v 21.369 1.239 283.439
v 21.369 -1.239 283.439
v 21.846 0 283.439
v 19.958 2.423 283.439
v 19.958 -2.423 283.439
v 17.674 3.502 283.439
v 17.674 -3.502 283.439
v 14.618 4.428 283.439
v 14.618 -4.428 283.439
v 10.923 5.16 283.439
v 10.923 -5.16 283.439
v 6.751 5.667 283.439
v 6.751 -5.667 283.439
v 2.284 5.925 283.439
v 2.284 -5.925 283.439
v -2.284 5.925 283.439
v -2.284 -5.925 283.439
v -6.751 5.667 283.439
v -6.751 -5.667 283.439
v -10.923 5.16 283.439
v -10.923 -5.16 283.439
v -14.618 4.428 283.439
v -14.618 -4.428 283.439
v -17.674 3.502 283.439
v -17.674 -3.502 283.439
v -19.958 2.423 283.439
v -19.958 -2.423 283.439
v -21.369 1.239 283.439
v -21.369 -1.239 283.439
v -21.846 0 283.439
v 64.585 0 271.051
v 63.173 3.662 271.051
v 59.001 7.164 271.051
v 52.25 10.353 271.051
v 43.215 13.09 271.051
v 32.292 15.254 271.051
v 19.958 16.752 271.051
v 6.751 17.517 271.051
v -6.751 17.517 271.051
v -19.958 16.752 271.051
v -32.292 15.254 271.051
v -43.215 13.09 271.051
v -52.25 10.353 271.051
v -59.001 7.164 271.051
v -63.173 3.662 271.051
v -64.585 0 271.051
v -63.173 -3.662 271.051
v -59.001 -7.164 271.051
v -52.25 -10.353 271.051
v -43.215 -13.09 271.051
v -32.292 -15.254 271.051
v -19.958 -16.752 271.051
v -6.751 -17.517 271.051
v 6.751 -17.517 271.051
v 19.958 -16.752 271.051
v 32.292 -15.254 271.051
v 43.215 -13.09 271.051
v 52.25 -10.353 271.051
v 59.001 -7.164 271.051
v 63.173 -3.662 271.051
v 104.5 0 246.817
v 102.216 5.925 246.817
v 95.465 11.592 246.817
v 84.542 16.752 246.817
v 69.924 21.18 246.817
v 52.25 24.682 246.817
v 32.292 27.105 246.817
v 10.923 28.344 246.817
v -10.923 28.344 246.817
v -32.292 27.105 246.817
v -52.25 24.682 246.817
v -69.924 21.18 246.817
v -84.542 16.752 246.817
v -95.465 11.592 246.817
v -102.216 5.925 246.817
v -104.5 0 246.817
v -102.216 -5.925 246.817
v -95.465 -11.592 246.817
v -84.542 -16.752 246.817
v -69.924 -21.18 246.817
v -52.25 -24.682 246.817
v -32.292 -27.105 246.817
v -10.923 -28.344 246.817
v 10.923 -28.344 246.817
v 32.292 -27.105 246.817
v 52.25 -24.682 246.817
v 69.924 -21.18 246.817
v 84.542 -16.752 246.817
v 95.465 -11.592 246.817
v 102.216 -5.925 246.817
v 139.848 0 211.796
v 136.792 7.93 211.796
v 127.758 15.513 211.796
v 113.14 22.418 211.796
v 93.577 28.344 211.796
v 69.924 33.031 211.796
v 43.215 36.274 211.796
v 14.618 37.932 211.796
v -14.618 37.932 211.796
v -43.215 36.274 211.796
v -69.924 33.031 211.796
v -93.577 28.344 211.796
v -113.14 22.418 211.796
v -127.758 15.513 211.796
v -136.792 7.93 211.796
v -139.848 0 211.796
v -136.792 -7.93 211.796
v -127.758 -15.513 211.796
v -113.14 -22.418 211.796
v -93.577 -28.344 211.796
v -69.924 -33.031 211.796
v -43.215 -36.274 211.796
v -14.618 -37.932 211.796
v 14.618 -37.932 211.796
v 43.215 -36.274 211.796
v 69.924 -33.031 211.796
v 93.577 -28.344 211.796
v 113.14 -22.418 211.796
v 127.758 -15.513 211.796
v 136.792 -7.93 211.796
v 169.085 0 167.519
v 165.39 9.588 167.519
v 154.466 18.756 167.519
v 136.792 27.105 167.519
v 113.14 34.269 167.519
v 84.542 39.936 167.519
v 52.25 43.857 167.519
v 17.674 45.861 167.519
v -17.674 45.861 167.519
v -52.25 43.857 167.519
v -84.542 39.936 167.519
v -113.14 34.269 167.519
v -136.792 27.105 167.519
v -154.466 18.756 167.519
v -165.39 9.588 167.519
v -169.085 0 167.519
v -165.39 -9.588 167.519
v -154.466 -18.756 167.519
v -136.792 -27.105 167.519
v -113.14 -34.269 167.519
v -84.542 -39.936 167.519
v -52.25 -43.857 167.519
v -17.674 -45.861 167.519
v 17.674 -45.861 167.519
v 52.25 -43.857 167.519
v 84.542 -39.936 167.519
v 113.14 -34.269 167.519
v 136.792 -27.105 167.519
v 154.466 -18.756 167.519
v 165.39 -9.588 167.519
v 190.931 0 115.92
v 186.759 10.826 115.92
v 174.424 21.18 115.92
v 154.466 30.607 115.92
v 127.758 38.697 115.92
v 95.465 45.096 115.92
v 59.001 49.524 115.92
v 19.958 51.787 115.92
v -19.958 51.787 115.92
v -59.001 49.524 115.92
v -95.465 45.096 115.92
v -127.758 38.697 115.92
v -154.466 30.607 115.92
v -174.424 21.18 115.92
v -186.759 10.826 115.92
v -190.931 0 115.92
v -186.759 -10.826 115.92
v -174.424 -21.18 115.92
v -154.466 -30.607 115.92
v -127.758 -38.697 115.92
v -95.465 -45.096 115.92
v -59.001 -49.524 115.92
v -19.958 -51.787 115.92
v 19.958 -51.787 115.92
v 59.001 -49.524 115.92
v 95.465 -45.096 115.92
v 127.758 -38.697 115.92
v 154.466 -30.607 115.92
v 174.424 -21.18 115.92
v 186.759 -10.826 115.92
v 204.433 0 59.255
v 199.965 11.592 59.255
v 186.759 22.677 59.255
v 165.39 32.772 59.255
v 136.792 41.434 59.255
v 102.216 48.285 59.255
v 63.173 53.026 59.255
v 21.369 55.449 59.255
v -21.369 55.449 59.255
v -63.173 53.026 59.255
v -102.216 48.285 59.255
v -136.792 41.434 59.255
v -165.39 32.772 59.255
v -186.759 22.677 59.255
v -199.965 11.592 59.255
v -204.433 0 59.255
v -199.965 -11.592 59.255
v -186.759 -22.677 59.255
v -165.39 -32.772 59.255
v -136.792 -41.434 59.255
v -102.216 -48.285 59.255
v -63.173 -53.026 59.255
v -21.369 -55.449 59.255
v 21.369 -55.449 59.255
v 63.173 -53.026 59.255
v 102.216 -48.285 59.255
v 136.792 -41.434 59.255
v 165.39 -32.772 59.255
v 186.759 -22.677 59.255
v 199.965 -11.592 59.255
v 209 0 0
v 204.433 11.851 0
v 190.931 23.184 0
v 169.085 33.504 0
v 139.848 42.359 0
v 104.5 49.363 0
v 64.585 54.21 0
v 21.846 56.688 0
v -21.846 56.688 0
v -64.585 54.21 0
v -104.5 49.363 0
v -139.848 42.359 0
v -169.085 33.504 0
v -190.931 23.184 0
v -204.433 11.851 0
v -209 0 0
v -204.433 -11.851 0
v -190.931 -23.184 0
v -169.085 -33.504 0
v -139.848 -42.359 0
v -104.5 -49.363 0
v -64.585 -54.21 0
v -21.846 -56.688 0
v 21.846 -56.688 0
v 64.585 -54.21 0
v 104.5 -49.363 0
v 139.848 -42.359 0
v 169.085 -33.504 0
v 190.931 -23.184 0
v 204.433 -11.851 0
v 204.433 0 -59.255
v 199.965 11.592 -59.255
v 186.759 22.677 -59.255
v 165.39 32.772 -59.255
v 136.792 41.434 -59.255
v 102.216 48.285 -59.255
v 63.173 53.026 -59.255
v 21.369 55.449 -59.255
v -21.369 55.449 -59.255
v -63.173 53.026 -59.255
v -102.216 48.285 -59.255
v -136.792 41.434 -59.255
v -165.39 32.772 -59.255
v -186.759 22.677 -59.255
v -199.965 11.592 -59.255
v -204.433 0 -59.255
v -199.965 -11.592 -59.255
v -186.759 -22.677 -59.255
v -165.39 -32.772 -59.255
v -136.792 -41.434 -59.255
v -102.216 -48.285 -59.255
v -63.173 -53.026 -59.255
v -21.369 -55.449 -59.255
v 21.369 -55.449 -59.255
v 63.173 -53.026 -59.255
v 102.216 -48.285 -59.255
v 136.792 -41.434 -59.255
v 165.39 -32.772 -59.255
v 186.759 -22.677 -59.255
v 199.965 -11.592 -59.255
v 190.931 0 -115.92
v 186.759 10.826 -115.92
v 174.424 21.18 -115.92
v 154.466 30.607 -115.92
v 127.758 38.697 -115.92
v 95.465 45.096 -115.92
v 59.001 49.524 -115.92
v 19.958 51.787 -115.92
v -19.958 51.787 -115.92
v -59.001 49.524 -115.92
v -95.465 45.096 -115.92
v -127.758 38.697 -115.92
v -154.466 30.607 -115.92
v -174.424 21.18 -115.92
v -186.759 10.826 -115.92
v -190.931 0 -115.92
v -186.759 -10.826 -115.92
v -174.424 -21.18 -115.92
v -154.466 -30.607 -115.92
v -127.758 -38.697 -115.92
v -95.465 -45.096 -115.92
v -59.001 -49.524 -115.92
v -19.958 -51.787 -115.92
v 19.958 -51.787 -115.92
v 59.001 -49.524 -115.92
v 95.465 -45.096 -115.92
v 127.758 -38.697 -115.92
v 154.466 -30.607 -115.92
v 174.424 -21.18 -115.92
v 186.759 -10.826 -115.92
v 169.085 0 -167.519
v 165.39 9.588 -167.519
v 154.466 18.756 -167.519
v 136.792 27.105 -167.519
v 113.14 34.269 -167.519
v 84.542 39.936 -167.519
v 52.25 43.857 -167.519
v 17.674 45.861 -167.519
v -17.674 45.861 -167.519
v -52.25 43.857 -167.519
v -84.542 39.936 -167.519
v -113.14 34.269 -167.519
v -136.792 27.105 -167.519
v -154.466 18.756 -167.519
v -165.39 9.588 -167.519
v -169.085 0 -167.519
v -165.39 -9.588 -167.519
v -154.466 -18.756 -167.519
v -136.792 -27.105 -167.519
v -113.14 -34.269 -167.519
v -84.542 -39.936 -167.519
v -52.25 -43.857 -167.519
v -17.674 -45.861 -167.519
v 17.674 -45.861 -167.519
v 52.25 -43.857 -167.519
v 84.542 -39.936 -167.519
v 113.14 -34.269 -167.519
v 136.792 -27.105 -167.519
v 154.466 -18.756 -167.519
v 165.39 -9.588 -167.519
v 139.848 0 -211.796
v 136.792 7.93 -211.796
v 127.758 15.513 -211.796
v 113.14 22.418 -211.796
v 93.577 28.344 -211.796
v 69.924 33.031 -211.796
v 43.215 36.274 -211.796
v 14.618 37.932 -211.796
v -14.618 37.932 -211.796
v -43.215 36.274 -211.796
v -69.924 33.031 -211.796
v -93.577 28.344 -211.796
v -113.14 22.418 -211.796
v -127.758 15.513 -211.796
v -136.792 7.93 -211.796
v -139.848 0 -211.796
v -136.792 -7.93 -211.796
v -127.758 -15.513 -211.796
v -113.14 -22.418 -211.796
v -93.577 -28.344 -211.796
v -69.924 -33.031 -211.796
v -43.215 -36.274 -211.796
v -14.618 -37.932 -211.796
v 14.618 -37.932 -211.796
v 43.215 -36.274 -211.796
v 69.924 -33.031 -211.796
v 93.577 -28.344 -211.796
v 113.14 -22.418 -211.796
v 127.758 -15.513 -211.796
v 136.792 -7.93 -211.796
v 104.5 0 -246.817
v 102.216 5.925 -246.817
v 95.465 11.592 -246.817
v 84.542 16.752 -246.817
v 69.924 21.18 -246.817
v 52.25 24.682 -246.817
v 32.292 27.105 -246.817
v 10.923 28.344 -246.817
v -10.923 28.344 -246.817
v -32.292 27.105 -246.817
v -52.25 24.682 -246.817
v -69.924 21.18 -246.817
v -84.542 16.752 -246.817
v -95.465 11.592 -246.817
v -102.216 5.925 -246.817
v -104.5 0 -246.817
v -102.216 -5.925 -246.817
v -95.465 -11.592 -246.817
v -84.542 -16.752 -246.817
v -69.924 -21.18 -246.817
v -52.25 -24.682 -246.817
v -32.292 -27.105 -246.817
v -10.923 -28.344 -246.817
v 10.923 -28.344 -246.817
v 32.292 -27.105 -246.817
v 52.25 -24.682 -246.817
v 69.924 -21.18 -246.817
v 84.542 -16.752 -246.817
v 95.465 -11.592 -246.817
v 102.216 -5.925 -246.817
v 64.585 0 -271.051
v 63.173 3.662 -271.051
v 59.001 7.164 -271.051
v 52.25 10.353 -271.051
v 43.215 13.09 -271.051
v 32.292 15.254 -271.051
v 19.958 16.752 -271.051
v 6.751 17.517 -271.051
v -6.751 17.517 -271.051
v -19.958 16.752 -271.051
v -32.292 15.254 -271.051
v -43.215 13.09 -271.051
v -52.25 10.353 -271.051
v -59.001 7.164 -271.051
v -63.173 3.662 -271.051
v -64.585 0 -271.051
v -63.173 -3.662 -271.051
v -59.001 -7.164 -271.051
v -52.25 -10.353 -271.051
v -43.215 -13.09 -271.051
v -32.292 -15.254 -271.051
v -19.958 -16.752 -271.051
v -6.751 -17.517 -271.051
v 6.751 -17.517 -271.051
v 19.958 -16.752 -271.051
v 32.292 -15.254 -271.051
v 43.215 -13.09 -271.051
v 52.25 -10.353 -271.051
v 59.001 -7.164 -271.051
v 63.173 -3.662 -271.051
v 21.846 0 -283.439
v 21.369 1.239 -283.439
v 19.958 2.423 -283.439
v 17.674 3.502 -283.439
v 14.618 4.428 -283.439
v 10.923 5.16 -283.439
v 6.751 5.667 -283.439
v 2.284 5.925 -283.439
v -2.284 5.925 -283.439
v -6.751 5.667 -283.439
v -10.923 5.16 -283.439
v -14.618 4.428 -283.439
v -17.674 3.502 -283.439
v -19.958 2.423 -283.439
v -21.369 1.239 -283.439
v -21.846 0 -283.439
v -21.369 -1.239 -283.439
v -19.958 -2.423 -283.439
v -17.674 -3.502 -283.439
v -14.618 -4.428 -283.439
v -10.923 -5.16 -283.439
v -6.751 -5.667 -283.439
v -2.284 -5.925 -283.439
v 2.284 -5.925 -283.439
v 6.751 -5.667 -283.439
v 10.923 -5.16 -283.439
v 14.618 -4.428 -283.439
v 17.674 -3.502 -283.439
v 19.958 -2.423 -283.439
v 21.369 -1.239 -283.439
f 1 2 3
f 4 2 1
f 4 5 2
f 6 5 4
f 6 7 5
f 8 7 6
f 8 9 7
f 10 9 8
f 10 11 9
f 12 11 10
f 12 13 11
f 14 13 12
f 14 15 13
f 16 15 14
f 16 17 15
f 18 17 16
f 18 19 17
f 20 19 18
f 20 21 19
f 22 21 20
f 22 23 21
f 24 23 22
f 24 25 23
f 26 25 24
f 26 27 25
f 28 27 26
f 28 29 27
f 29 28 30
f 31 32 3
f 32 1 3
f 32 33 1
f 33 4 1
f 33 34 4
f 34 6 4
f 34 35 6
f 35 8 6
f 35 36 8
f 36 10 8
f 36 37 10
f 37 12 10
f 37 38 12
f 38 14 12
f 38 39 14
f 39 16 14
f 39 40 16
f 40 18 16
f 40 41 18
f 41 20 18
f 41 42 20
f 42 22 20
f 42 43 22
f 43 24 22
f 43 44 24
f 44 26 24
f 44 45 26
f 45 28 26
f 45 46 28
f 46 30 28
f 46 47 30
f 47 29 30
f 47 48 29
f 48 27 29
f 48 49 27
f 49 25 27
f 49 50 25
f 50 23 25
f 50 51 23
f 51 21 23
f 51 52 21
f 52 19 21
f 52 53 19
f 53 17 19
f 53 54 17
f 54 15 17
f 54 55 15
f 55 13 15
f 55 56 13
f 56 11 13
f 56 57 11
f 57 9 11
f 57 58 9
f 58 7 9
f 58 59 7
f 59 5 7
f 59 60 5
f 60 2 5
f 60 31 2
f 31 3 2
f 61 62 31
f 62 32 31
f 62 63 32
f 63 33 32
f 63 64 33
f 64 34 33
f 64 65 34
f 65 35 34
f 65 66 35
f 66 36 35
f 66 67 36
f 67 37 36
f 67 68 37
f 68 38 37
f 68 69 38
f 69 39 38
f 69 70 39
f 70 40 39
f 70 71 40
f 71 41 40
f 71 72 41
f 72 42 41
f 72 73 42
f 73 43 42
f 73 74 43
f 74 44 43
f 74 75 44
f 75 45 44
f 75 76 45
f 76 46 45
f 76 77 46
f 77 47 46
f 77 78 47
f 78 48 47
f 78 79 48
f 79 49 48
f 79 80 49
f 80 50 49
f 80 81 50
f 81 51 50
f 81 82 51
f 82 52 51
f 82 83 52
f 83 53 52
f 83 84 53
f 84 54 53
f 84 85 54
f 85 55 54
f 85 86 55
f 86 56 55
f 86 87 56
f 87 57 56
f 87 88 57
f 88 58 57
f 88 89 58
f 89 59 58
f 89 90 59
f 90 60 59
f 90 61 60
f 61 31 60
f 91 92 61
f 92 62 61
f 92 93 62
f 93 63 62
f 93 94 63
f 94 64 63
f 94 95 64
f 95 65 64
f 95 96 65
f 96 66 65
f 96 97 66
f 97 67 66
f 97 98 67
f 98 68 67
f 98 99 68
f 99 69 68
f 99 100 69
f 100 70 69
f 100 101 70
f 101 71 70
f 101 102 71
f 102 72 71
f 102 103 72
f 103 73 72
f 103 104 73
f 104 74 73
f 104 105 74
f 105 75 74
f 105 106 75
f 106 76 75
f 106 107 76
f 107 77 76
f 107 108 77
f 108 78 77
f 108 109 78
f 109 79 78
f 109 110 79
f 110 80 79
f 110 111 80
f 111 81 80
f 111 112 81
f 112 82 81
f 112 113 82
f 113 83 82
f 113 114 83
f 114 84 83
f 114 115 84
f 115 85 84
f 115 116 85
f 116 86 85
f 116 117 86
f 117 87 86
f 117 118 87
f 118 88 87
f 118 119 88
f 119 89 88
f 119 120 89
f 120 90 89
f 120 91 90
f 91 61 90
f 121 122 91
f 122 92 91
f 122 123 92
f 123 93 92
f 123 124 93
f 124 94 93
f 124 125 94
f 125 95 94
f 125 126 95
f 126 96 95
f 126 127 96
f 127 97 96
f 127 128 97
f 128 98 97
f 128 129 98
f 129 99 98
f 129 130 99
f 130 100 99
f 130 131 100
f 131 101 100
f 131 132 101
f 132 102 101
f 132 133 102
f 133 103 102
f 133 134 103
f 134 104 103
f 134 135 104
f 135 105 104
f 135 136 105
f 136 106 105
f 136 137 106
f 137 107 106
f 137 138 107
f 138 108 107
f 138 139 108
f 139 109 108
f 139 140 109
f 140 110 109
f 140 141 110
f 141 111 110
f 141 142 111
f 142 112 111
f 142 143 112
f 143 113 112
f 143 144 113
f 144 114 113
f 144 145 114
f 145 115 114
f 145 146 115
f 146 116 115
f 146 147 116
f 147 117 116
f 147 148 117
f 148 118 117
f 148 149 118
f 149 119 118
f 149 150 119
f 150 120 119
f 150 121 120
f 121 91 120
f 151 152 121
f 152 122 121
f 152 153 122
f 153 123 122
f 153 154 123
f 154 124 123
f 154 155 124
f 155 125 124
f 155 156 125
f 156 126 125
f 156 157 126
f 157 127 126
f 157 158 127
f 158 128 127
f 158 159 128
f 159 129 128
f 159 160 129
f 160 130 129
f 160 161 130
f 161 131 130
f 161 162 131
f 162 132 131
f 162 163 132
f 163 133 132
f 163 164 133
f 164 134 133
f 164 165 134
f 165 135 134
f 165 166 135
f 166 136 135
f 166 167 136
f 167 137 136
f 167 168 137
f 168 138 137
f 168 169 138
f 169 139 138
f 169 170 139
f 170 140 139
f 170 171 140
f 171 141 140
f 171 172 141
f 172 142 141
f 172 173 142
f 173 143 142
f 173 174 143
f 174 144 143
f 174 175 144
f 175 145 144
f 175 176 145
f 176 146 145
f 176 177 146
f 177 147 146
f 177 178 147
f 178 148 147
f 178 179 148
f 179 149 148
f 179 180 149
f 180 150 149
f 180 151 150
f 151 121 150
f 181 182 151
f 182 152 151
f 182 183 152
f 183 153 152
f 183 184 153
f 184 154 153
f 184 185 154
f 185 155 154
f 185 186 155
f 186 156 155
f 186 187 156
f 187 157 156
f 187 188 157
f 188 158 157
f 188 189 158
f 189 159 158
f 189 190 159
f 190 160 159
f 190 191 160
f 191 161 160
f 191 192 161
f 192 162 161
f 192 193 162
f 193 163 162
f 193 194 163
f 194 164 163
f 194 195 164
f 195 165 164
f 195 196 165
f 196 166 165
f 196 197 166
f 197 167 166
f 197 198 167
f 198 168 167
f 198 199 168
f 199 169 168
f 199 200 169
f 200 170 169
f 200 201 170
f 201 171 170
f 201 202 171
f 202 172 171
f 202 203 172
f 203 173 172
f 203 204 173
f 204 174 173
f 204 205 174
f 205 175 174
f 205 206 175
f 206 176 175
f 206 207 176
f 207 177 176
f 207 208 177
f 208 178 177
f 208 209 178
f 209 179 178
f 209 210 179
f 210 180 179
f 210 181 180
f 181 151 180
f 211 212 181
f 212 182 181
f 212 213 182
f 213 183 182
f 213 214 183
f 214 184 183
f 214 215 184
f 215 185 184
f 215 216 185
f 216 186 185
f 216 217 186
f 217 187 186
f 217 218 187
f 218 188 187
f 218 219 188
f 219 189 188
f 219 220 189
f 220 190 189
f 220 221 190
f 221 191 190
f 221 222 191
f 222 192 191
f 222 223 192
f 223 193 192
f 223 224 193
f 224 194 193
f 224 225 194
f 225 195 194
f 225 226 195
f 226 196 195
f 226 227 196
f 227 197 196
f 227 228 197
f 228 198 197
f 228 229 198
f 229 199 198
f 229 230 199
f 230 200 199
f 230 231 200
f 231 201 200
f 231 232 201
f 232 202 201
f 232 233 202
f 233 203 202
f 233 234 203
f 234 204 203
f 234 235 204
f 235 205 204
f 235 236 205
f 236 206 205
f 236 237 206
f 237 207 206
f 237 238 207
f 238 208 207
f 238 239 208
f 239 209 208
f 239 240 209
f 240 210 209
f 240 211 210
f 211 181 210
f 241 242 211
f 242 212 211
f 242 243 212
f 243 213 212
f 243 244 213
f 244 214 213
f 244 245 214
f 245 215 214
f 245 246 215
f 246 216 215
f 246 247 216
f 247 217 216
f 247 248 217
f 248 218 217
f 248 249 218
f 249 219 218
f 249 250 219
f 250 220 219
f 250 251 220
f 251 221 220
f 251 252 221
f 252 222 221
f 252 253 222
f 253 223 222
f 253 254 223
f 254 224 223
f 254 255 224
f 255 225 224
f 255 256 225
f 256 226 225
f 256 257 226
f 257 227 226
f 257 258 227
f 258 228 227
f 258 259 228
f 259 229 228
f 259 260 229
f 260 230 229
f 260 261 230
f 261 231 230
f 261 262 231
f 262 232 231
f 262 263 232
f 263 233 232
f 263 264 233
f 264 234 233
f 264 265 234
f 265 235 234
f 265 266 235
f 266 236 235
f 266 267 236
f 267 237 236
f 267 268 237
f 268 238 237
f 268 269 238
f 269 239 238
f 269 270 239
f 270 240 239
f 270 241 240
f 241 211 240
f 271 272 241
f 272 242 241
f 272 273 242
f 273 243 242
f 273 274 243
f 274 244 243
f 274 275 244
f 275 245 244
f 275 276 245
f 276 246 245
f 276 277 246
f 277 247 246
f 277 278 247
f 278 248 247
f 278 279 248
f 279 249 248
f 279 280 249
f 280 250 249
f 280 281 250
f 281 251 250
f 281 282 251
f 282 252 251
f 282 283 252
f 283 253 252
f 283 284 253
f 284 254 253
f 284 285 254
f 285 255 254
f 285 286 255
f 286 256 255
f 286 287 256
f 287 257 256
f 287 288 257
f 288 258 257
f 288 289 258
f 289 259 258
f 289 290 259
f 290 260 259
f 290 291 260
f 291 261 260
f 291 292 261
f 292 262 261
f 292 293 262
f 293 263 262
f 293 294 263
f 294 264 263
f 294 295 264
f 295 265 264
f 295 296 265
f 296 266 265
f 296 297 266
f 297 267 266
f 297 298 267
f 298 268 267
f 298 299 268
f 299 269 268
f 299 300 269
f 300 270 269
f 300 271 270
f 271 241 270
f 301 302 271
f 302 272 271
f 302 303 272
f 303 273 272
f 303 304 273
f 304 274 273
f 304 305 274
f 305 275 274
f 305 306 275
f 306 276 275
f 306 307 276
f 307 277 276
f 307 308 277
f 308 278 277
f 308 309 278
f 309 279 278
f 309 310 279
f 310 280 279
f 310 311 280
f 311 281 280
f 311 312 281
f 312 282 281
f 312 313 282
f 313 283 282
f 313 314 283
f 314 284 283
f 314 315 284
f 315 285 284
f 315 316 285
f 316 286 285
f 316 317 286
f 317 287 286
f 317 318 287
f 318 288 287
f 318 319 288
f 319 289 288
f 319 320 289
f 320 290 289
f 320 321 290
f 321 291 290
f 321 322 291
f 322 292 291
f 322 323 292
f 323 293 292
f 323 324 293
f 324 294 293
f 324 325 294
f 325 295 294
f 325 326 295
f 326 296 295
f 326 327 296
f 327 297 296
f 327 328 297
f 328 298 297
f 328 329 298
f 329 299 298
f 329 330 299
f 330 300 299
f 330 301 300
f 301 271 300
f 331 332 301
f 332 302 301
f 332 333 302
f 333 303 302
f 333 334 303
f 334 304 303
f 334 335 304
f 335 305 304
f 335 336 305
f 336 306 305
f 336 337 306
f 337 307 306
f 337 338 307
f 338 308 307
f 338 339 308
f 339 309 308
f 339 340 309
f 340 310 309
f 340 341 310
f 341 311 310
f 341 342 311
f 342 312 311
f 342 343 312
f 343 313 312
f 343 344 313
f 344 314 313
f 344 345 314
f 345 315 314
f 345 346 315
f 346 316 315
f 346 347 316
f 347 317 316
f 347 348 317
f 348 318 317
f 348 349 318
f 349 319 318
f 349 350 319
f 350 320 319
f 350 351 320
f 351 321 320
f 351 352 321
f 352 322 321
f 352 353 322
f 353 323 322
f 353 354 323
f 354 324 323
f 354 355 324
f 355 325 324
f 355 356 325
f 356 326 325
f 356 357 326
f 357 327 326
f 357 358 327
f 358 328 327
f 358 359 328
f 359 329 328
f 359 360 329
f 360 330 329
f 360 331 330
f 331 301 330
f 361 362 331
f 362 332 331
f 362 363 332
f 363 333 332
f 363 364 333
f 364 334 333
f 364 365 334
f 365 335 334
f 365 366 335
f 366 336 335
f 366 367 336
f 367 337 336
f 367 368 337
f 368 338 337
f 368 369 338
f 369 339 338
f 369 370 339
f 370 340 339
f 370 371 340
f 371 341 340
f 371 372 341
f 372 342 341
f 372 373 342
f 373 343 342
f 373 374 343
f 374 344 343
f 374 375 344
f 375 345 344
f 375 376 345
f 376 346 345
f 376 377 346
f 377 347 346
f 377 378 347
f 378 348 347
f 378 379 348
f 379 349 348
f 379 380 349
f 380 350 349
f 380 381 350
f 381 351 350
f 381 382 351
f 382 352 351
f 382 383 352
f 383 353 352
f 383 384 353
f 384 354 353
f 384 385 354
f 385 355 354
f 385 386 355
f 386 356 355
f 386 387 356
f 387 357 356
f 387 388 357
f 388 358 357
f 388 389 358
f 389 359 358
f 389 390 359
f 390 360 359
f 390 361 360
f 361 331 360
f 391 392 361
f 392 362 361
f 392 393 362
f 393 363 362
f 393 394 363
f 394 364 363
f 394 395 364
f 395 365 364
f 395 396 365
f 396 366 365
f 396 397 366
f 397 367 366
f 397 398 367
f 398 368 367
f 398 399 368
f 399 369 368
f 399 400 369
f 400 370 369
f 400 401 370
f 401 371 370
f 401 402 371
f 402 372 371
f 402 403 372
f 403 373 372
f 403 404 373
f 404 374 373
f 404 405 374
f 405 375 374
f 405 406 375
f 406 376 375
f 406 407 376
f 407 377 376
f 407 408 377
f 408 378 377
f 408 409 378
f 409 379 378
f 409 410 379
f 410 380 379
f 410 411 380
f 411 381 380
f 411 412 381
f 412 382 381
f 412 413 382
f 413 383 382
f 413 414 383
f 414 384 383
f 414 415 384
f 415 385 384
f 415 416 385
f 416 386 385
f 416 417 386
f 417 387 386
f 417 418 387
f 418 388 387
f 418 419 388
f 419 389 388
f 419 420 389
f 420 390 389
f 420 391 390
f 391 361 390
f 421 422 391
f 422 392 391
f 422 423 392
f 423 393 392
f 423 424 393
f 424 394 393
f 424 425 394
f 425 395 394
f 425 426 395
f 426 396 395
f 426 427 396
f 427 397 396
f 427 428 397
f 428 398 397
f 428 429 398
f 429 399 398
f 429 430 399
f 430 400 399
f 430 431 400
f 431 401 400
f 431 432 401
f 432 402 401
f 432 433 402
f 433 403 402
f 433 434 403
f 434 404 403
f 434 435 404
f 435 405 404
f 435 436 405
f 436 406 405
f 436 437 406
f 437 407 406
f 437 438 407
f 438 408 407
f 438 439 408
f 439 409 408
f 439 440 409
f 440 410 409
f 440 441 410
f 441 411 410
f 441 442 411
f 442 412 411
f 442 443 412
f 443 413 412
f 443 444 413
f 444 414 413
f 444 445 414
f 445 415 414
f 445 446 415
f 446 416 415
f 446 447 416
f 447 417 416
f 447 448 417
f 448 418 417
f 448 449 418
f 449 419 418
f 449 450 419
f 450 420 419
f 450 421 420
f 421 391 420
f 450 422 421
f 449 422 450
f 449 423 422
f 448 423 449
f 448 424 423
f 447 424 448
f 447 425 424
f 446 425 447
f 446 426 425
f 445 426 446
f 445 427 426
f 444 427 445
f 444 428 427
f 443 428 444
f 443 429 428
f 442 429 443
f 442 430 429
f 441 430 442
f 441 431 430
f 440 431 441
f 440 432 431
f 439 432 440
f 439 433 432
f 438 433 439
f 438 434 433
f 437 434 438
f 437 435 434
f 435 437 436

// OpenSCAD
// Generated by SolidPython 1.0.1 on 2020-07-29 00:46:49


scale(v = [11, 3, 15]) {
	sphere(r = 19);
}
/***********************************************
*********      SolidPython code:      **********
************************************************
 
# import packages: SolidPython
from solid import *
from solid.utils import *
from itertools import chain, combinations, permutations


class Resize:

    def __init__(self, scad_file):
        self.scad_file = scad_file
        #self.scad_file = import_scad(scad_file)
        # cone/cylinder param:
        self.r1 = 0
        self.r2 = 0
        self.h = 0
        # rectangular prism param:
        self.w = 0
        self.l = 0
        # ellipse param:
        self.r = 0

    # import OpenScad code (file name corresponds to shape)


    # classify shape + parameters
    def assign(self, param1, param2, param3):
        if self.scad_file == 'cone.scad':
            self.r1 = param1
            self.r2 = param2
            self.h = param3
        elif self.scad_file == 'cylinder.scad':
            self.r1 = param1
            self.r2 = param2
            self.h = param3
        elif self.scad_file == 'rectangularPrism.scad':
            self.h = param1
            self.l = param2
            self.w = param3
        else:
            self.r = param1
            self.h = param2

    # resize parameters
    def iterate(self):
        x = range(3, 20, 2)
        i = 1
        if self.scad_file == 'cone.scad':
            tempList = list(permutations(x, 2))
            for temp in tempList:
                param1 = temp[0]
                param2 = temp[1]
                filepath = 'produced_scad_files/' + 'cone' + str(param1) + '_' + str(param2) + '_' + '.scad'
                scad_render_to_file(cylinder(h=param1, r1=param2, r2=0), filepath)

        elif self.scad_file == 'cylinder.scad':
            tempList = list(permutations(x, 3))
            for temp in tempList:
                param1 = temp[0]
                param2 = temp[1]
                filepath = 'produced_scad_files/' + 'cylinder' + str(param1) + '_' + str(param2) + '_' + '.scad'
                scad_render_to_file(cylinder(h=param1, r1=param2, r2=param2), filepath)

        elif self.scad_file == 'rectangularPrism.scad':
            tempList = list(permutations(x, 3))
            for temp in tempList:
                param1 = temp[0]
                param2 = temp[1]
                param3 = temp[2]
                filepath = 'produced_scad_files/' + 'rectangularPrism' + str(param1) + '_' + str(param2) + '_' + str(
                    param3) + '.scad'
                scad_render_to_file(cube(size=(param1, param2, param3)), filepath)

        elif self.scad_file == 'ellipse.scad':
            tempList = list(permutations(x, 4))
            for temp in tempList:
                param1 = temp[0]
                param2 = temp[1]
                param3 = temp[2]
                param4 = temp[3]
                filepath = 'produced_scad_files/' + 'ellipse' + str(param1) + '_' + str(param2) + '_' + str(param3) + '_' + str(param4) + '.scad'
                scad_render_to_file(scale([param1, param2, param3])(sphere(r=param4)), filepath)

    def render_to_scadfile(self):
        scad_render_to_file(scad, 'example.scad') 
 
************************************************/
